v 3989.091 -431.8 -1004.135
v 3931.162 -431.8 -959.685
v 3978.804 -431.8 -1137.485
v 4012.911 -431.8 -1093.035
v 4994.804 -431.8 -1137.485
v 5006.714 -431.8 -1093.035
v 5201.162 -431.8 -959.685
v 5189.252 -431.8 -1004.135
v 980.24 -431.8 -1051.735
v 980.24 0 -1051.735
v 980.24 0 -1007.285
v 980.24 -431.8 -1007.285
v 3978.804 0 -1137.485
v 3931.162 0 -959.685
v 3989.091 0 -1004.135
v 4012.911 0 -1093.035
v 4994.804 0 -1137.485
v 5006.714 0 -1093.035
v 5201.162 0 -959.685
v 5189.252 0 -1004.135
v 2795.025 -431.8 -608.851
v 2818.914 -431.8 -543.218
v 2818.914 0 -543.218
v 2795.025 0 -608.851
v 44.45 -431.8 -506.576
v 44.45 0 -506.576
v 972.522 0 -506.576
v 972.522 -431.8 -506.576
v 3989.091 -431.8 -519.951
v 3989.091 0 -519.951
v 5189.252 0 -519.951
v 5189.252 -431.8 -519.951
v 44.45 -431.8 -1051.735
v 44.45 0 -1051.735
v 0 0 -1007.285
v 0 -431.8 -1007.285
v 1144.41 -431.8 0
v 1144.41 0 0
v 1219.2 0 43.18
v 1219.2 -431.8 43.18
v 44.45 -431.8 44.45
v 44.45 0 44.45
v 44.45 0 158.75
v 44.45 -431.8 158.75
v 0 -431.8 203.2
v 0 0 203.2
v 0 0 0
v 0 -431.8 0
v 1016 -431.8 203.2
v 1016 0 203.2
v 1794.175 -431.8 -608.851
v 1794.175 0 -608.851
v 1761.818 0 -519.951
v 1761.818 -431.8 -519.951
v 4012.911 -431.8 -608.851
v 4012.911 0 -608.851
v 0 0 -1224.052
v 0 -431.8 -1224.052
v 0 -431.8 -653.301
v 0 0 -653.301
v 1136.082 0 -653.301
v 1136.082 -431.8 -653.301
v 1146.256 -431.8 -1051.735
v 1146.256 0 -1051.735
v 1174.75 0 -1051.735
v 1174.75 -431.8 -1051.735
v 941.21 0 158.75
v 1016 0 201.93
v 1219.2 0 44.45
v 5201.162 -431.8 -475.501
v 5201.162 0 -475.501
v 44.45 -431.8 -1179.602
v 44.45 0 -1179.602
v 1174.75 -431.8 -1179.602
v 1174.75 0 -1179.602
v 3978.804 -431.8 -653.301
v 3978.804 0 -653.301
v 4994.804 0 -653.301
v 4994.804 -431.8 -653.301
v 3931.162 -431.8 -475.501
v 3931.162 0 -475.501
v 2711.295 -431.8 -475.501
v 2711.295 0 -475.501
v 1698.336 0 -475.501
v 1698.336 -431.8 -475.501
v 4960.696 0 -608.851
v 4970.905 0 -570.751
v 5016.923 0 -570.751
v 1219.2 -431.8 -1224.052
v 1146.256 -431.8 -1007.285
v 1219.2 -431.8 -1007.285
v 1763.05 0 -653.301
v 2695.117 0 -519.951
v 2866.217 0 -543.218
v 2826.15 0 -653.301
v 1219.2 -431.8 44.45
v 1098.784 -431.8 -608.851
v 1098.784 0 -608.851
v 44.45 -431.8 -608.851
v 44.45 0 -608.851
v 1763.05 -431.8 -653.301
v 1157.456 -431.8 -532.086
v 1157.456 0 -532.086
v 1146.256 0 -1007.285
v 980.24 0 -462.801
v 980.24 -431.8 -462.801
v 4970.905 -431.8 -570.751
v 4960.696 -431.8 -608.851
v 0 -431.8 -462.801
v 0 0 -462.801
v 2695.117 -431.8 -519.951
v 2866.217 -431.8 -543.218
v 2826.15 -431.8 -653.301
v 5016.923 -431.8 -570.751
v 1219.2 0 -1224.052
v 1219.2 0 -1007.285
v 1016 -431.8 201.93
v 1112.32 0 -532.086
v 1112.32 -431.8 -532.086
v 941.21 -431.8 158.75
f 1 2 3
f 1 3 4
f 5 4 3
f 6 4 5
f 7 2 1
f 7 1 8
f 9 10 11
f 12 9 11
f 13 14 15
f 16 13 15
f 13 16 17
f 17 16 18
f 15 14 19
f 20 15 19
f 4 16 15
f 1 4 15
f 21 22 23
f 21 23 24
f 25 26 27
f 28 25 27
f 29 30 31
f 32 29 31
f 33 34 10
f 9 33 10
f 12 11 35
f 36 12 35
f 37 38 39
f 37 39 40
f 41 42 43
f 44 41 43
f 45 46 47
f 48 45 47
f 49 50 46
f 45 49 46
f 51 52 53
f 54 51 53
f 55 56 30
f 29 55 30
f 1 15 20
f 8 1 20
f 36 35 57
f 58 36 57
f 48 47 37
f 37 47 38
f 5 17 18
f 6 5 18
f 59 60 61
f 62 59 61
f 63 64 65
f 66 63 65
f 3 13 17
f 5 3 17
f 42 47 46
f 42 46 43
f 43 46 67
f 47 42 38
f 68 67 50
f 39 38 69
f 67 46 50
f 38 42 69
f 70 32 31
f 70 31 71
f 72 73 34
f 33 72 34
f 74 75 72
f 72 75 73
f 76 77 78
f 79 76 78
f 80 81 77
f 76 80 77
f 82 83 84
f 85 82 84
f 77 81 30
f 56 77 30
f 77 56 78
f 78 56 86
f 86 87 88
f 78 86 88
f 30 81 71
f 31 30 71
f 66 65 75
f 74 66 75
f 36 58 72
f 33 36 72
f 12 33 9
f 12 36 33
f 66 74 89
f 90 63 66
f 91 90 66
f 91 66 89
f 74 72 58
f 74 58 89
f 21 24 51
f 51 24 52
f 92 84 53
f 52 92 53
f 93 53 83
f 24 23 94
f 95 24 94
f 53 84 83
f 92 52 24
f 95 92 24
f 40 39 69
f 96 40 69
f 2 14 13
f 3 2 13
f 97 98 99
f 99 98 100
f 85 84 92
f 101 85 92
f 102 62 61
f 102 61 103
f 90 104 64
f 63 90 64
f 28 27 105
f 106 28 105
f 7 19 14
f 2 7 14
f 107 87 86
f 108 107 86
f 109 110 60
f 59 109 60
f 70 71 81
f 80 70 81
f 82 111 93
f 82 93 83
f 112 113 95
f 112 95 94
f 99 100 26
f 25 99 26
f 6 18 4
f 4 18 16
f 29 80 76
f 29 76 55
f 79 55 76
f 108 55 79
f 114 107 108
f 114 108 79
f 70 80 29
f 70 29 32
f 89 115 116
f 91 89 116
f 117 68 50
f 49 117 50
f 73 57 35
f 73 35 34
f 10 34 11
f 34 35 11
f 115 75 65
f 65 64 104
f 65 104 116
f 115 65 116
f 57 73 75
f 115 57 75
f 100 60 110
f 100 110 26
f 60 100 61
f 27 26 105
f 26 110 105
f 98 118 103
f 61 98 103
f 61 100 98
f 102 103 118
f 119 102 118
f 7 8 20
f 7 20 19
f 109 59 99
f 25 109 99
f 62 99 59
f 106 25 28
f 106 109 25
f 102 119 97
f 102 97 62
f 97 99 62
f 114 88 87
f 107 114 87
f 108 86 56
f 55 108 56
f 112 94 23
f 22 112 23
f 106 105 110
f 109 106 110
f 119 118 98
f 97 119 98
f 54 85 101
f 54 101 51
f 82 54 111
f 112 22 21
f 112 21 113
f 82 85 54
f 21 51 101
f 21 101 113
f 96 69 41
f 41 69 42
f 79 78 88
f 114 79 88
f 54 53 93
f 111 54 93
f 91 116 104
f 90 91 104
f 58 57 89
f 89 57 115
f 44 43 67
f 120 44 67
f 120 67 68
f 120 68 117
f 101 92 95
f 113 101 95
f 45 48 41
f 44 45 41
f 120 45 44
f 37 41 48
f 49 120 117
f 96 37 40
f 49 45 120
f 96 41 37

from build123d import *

# Parameters (mm, degrees)
F1_DEPTH   = 431.8
F2_SIZE2   = 74.7899538708
F2_SIZE    = 43.18
F2_2_SIZE2 = 74.7899538708
F2_2_SIZE  = 43.18


with BuildPart() as f1:
    # F0 (on Front) → F1 (new body)
    with BuildSketch(Plane.XZ):
        Polygon((1016, 158.75), (1016, 203.2), (0, 203.2), (0, 0), (1219.2, 0), (1219.2, 44.45), (44.45, 44.45), (44.45, 158.75), align=None)
    extrude(amount=F1_DEPTH)

    # F2
    f2_edges = [f1.edges().sort_by_distance(p)[0] for p in [
        (1219.2, -215.9, 0),
    ]]
    f2_side = f1.faces().sort_by_distance((1219.2, -215.9, 22.225))[0]
    chamfer(f2_edges, length=F2_SIZE, length2=F2_SIZE2, reference=f2_side)

    # F2#2
    f2_2_edges = [f1.edges().sort_by_distance(p)[0] for p in [
        (1016, -215.9, 158.75),
    ]]
    f2_2_side = f1.faces().sort_by_distance((1016, -215.9, 180.975))[0]
    chamfer(f2_2_edges, length=F2_2_SIZE, length2=F2_2_SIZE2, reference=f2_2_side)


with BuildPart() as f1b:
    # F0 (on Front) → F1, piece 2 (new body)
    with BuildSketch(Plane.XZ):
        Polygon((972.52150469, -506.5759436351), (980.2401661873, -462.8012390137), (0, -462.8012390137), (0, -653.3012390137), (1136.0823803587, -653.3012390137), (1157.4558151349, -532.0864669441), (1112.3201022366, -532.0864669441), (1098.7844017528, -608.8512390137), (44.45, -608.8512390137), (44.45, -506.5759436351), align=None)
    extrude(amount=F1_DEPTH)


with BuildPart() as f1c:
    # F0 (on Front) → F1, piece 3 (new body)
    with BuildSketch(Plane.XZ):
        Polygon((980.2401661873, -1051.7349137777), (980.2401661873, -1007.2849137777), (0, -1007.2849137777), (0, -1224.0524632925), (1219.2, -1224.0524632925), (1219.2, -1007.2849137777), (1146.2560296059, -1007.2849137777), (1146.2560296059, -1051.7349137777), (1174.75, -1051.7349137777), (1174.75, -1179.6024632925), (44.45, -1179.6024632925), (44.45, -1051.7349137777), align=None)
    extrude(amount=F1_DEPTH)


with BuildPart() as f1d:
    # F0 (on Front) → F1, piece 4 (new body)
    with BuildSketch(Plane.XZ):
        Polygon((2695.1165082038, -519.9512390137), (2711.2949851169, -475.5012390137), (1698.3364767881, -475.5012390137), (1763.0503844407, -653.3012390137), (2826.1495695697, -653.3012390137), (2866.2166171355, -543.2179305625), (2818.9139151489, -543.2179305625), (2795.0253444963, -608.8512390137), (1794.1746095141, -608.8512390137), (1761.8176556878, -519.9512390137), align=None)
    extrude(amount=F1_DEPTH)


with BuildPart() as f1e:
    # F0 (on Front) → F1, piece 5 (new body)
    with BuildSketch(Plane.XZ):
        Polygon((5189.2518063713, -519.9512390137), (5201.1621479749, -475.5012390137), (3931.1621479749, -475.5012390137), (3989.0905157977, -519.9512390137), align=None)
        Polygon((3989.0905157977, -519.9512390137), (3931.1621479749, -475.5012390137), (3978.8035143891, -653.3012390137), (4012.9111990048, -608.8512390137), align=None)
        Polygon((4012.9111990048, -608.8512390137), (3978.8035143891, -653.3012390137), (4994.8035143891, -653.3012390137), (4960.6958297735, -608.8512390137), align=None)
        Polygon((4960.6958297735, -608.8512390137), (4994.8035143891, -653.3012390137), (5016.9227202243, -570.7512390137), (4970.9046940051, -570.7512390137), align=None)
    extrude(amount=F1_DEPTH)


with BuildPart() as f1f:
    # F0 (on Front) → F1, piece 6 (new body)
    with BuildSketch(Plane.XZ):
        Polygon((5189.2518063713, -1004.1349826813), (5201.1621479749, -959.6849826813), (3931.1621479749, -959.6849826813), (3989.0905157977, -1004.1349826813), align=None)
        Polygon((3989.0905157977, -1004.1349826813), (3931.1621479749, -959.6849826813), (3978.8035143891, -1137.4849826813), (4012.9111990048, -1093.0349826813), align=None)
        Polygon((4012.9111990048, -1093.0349826813), (3978.8035143891, -1137.4849826813), (4994.8035143891, -1137.4849826813), (5006.7138559927, -1093.0349826813), align=None)
    extrude(amount=F1_DEPTH)


solid = Compound([f1.part, f1b.part, f1c.part, f1d.part, f1e.part, f1f.part])
